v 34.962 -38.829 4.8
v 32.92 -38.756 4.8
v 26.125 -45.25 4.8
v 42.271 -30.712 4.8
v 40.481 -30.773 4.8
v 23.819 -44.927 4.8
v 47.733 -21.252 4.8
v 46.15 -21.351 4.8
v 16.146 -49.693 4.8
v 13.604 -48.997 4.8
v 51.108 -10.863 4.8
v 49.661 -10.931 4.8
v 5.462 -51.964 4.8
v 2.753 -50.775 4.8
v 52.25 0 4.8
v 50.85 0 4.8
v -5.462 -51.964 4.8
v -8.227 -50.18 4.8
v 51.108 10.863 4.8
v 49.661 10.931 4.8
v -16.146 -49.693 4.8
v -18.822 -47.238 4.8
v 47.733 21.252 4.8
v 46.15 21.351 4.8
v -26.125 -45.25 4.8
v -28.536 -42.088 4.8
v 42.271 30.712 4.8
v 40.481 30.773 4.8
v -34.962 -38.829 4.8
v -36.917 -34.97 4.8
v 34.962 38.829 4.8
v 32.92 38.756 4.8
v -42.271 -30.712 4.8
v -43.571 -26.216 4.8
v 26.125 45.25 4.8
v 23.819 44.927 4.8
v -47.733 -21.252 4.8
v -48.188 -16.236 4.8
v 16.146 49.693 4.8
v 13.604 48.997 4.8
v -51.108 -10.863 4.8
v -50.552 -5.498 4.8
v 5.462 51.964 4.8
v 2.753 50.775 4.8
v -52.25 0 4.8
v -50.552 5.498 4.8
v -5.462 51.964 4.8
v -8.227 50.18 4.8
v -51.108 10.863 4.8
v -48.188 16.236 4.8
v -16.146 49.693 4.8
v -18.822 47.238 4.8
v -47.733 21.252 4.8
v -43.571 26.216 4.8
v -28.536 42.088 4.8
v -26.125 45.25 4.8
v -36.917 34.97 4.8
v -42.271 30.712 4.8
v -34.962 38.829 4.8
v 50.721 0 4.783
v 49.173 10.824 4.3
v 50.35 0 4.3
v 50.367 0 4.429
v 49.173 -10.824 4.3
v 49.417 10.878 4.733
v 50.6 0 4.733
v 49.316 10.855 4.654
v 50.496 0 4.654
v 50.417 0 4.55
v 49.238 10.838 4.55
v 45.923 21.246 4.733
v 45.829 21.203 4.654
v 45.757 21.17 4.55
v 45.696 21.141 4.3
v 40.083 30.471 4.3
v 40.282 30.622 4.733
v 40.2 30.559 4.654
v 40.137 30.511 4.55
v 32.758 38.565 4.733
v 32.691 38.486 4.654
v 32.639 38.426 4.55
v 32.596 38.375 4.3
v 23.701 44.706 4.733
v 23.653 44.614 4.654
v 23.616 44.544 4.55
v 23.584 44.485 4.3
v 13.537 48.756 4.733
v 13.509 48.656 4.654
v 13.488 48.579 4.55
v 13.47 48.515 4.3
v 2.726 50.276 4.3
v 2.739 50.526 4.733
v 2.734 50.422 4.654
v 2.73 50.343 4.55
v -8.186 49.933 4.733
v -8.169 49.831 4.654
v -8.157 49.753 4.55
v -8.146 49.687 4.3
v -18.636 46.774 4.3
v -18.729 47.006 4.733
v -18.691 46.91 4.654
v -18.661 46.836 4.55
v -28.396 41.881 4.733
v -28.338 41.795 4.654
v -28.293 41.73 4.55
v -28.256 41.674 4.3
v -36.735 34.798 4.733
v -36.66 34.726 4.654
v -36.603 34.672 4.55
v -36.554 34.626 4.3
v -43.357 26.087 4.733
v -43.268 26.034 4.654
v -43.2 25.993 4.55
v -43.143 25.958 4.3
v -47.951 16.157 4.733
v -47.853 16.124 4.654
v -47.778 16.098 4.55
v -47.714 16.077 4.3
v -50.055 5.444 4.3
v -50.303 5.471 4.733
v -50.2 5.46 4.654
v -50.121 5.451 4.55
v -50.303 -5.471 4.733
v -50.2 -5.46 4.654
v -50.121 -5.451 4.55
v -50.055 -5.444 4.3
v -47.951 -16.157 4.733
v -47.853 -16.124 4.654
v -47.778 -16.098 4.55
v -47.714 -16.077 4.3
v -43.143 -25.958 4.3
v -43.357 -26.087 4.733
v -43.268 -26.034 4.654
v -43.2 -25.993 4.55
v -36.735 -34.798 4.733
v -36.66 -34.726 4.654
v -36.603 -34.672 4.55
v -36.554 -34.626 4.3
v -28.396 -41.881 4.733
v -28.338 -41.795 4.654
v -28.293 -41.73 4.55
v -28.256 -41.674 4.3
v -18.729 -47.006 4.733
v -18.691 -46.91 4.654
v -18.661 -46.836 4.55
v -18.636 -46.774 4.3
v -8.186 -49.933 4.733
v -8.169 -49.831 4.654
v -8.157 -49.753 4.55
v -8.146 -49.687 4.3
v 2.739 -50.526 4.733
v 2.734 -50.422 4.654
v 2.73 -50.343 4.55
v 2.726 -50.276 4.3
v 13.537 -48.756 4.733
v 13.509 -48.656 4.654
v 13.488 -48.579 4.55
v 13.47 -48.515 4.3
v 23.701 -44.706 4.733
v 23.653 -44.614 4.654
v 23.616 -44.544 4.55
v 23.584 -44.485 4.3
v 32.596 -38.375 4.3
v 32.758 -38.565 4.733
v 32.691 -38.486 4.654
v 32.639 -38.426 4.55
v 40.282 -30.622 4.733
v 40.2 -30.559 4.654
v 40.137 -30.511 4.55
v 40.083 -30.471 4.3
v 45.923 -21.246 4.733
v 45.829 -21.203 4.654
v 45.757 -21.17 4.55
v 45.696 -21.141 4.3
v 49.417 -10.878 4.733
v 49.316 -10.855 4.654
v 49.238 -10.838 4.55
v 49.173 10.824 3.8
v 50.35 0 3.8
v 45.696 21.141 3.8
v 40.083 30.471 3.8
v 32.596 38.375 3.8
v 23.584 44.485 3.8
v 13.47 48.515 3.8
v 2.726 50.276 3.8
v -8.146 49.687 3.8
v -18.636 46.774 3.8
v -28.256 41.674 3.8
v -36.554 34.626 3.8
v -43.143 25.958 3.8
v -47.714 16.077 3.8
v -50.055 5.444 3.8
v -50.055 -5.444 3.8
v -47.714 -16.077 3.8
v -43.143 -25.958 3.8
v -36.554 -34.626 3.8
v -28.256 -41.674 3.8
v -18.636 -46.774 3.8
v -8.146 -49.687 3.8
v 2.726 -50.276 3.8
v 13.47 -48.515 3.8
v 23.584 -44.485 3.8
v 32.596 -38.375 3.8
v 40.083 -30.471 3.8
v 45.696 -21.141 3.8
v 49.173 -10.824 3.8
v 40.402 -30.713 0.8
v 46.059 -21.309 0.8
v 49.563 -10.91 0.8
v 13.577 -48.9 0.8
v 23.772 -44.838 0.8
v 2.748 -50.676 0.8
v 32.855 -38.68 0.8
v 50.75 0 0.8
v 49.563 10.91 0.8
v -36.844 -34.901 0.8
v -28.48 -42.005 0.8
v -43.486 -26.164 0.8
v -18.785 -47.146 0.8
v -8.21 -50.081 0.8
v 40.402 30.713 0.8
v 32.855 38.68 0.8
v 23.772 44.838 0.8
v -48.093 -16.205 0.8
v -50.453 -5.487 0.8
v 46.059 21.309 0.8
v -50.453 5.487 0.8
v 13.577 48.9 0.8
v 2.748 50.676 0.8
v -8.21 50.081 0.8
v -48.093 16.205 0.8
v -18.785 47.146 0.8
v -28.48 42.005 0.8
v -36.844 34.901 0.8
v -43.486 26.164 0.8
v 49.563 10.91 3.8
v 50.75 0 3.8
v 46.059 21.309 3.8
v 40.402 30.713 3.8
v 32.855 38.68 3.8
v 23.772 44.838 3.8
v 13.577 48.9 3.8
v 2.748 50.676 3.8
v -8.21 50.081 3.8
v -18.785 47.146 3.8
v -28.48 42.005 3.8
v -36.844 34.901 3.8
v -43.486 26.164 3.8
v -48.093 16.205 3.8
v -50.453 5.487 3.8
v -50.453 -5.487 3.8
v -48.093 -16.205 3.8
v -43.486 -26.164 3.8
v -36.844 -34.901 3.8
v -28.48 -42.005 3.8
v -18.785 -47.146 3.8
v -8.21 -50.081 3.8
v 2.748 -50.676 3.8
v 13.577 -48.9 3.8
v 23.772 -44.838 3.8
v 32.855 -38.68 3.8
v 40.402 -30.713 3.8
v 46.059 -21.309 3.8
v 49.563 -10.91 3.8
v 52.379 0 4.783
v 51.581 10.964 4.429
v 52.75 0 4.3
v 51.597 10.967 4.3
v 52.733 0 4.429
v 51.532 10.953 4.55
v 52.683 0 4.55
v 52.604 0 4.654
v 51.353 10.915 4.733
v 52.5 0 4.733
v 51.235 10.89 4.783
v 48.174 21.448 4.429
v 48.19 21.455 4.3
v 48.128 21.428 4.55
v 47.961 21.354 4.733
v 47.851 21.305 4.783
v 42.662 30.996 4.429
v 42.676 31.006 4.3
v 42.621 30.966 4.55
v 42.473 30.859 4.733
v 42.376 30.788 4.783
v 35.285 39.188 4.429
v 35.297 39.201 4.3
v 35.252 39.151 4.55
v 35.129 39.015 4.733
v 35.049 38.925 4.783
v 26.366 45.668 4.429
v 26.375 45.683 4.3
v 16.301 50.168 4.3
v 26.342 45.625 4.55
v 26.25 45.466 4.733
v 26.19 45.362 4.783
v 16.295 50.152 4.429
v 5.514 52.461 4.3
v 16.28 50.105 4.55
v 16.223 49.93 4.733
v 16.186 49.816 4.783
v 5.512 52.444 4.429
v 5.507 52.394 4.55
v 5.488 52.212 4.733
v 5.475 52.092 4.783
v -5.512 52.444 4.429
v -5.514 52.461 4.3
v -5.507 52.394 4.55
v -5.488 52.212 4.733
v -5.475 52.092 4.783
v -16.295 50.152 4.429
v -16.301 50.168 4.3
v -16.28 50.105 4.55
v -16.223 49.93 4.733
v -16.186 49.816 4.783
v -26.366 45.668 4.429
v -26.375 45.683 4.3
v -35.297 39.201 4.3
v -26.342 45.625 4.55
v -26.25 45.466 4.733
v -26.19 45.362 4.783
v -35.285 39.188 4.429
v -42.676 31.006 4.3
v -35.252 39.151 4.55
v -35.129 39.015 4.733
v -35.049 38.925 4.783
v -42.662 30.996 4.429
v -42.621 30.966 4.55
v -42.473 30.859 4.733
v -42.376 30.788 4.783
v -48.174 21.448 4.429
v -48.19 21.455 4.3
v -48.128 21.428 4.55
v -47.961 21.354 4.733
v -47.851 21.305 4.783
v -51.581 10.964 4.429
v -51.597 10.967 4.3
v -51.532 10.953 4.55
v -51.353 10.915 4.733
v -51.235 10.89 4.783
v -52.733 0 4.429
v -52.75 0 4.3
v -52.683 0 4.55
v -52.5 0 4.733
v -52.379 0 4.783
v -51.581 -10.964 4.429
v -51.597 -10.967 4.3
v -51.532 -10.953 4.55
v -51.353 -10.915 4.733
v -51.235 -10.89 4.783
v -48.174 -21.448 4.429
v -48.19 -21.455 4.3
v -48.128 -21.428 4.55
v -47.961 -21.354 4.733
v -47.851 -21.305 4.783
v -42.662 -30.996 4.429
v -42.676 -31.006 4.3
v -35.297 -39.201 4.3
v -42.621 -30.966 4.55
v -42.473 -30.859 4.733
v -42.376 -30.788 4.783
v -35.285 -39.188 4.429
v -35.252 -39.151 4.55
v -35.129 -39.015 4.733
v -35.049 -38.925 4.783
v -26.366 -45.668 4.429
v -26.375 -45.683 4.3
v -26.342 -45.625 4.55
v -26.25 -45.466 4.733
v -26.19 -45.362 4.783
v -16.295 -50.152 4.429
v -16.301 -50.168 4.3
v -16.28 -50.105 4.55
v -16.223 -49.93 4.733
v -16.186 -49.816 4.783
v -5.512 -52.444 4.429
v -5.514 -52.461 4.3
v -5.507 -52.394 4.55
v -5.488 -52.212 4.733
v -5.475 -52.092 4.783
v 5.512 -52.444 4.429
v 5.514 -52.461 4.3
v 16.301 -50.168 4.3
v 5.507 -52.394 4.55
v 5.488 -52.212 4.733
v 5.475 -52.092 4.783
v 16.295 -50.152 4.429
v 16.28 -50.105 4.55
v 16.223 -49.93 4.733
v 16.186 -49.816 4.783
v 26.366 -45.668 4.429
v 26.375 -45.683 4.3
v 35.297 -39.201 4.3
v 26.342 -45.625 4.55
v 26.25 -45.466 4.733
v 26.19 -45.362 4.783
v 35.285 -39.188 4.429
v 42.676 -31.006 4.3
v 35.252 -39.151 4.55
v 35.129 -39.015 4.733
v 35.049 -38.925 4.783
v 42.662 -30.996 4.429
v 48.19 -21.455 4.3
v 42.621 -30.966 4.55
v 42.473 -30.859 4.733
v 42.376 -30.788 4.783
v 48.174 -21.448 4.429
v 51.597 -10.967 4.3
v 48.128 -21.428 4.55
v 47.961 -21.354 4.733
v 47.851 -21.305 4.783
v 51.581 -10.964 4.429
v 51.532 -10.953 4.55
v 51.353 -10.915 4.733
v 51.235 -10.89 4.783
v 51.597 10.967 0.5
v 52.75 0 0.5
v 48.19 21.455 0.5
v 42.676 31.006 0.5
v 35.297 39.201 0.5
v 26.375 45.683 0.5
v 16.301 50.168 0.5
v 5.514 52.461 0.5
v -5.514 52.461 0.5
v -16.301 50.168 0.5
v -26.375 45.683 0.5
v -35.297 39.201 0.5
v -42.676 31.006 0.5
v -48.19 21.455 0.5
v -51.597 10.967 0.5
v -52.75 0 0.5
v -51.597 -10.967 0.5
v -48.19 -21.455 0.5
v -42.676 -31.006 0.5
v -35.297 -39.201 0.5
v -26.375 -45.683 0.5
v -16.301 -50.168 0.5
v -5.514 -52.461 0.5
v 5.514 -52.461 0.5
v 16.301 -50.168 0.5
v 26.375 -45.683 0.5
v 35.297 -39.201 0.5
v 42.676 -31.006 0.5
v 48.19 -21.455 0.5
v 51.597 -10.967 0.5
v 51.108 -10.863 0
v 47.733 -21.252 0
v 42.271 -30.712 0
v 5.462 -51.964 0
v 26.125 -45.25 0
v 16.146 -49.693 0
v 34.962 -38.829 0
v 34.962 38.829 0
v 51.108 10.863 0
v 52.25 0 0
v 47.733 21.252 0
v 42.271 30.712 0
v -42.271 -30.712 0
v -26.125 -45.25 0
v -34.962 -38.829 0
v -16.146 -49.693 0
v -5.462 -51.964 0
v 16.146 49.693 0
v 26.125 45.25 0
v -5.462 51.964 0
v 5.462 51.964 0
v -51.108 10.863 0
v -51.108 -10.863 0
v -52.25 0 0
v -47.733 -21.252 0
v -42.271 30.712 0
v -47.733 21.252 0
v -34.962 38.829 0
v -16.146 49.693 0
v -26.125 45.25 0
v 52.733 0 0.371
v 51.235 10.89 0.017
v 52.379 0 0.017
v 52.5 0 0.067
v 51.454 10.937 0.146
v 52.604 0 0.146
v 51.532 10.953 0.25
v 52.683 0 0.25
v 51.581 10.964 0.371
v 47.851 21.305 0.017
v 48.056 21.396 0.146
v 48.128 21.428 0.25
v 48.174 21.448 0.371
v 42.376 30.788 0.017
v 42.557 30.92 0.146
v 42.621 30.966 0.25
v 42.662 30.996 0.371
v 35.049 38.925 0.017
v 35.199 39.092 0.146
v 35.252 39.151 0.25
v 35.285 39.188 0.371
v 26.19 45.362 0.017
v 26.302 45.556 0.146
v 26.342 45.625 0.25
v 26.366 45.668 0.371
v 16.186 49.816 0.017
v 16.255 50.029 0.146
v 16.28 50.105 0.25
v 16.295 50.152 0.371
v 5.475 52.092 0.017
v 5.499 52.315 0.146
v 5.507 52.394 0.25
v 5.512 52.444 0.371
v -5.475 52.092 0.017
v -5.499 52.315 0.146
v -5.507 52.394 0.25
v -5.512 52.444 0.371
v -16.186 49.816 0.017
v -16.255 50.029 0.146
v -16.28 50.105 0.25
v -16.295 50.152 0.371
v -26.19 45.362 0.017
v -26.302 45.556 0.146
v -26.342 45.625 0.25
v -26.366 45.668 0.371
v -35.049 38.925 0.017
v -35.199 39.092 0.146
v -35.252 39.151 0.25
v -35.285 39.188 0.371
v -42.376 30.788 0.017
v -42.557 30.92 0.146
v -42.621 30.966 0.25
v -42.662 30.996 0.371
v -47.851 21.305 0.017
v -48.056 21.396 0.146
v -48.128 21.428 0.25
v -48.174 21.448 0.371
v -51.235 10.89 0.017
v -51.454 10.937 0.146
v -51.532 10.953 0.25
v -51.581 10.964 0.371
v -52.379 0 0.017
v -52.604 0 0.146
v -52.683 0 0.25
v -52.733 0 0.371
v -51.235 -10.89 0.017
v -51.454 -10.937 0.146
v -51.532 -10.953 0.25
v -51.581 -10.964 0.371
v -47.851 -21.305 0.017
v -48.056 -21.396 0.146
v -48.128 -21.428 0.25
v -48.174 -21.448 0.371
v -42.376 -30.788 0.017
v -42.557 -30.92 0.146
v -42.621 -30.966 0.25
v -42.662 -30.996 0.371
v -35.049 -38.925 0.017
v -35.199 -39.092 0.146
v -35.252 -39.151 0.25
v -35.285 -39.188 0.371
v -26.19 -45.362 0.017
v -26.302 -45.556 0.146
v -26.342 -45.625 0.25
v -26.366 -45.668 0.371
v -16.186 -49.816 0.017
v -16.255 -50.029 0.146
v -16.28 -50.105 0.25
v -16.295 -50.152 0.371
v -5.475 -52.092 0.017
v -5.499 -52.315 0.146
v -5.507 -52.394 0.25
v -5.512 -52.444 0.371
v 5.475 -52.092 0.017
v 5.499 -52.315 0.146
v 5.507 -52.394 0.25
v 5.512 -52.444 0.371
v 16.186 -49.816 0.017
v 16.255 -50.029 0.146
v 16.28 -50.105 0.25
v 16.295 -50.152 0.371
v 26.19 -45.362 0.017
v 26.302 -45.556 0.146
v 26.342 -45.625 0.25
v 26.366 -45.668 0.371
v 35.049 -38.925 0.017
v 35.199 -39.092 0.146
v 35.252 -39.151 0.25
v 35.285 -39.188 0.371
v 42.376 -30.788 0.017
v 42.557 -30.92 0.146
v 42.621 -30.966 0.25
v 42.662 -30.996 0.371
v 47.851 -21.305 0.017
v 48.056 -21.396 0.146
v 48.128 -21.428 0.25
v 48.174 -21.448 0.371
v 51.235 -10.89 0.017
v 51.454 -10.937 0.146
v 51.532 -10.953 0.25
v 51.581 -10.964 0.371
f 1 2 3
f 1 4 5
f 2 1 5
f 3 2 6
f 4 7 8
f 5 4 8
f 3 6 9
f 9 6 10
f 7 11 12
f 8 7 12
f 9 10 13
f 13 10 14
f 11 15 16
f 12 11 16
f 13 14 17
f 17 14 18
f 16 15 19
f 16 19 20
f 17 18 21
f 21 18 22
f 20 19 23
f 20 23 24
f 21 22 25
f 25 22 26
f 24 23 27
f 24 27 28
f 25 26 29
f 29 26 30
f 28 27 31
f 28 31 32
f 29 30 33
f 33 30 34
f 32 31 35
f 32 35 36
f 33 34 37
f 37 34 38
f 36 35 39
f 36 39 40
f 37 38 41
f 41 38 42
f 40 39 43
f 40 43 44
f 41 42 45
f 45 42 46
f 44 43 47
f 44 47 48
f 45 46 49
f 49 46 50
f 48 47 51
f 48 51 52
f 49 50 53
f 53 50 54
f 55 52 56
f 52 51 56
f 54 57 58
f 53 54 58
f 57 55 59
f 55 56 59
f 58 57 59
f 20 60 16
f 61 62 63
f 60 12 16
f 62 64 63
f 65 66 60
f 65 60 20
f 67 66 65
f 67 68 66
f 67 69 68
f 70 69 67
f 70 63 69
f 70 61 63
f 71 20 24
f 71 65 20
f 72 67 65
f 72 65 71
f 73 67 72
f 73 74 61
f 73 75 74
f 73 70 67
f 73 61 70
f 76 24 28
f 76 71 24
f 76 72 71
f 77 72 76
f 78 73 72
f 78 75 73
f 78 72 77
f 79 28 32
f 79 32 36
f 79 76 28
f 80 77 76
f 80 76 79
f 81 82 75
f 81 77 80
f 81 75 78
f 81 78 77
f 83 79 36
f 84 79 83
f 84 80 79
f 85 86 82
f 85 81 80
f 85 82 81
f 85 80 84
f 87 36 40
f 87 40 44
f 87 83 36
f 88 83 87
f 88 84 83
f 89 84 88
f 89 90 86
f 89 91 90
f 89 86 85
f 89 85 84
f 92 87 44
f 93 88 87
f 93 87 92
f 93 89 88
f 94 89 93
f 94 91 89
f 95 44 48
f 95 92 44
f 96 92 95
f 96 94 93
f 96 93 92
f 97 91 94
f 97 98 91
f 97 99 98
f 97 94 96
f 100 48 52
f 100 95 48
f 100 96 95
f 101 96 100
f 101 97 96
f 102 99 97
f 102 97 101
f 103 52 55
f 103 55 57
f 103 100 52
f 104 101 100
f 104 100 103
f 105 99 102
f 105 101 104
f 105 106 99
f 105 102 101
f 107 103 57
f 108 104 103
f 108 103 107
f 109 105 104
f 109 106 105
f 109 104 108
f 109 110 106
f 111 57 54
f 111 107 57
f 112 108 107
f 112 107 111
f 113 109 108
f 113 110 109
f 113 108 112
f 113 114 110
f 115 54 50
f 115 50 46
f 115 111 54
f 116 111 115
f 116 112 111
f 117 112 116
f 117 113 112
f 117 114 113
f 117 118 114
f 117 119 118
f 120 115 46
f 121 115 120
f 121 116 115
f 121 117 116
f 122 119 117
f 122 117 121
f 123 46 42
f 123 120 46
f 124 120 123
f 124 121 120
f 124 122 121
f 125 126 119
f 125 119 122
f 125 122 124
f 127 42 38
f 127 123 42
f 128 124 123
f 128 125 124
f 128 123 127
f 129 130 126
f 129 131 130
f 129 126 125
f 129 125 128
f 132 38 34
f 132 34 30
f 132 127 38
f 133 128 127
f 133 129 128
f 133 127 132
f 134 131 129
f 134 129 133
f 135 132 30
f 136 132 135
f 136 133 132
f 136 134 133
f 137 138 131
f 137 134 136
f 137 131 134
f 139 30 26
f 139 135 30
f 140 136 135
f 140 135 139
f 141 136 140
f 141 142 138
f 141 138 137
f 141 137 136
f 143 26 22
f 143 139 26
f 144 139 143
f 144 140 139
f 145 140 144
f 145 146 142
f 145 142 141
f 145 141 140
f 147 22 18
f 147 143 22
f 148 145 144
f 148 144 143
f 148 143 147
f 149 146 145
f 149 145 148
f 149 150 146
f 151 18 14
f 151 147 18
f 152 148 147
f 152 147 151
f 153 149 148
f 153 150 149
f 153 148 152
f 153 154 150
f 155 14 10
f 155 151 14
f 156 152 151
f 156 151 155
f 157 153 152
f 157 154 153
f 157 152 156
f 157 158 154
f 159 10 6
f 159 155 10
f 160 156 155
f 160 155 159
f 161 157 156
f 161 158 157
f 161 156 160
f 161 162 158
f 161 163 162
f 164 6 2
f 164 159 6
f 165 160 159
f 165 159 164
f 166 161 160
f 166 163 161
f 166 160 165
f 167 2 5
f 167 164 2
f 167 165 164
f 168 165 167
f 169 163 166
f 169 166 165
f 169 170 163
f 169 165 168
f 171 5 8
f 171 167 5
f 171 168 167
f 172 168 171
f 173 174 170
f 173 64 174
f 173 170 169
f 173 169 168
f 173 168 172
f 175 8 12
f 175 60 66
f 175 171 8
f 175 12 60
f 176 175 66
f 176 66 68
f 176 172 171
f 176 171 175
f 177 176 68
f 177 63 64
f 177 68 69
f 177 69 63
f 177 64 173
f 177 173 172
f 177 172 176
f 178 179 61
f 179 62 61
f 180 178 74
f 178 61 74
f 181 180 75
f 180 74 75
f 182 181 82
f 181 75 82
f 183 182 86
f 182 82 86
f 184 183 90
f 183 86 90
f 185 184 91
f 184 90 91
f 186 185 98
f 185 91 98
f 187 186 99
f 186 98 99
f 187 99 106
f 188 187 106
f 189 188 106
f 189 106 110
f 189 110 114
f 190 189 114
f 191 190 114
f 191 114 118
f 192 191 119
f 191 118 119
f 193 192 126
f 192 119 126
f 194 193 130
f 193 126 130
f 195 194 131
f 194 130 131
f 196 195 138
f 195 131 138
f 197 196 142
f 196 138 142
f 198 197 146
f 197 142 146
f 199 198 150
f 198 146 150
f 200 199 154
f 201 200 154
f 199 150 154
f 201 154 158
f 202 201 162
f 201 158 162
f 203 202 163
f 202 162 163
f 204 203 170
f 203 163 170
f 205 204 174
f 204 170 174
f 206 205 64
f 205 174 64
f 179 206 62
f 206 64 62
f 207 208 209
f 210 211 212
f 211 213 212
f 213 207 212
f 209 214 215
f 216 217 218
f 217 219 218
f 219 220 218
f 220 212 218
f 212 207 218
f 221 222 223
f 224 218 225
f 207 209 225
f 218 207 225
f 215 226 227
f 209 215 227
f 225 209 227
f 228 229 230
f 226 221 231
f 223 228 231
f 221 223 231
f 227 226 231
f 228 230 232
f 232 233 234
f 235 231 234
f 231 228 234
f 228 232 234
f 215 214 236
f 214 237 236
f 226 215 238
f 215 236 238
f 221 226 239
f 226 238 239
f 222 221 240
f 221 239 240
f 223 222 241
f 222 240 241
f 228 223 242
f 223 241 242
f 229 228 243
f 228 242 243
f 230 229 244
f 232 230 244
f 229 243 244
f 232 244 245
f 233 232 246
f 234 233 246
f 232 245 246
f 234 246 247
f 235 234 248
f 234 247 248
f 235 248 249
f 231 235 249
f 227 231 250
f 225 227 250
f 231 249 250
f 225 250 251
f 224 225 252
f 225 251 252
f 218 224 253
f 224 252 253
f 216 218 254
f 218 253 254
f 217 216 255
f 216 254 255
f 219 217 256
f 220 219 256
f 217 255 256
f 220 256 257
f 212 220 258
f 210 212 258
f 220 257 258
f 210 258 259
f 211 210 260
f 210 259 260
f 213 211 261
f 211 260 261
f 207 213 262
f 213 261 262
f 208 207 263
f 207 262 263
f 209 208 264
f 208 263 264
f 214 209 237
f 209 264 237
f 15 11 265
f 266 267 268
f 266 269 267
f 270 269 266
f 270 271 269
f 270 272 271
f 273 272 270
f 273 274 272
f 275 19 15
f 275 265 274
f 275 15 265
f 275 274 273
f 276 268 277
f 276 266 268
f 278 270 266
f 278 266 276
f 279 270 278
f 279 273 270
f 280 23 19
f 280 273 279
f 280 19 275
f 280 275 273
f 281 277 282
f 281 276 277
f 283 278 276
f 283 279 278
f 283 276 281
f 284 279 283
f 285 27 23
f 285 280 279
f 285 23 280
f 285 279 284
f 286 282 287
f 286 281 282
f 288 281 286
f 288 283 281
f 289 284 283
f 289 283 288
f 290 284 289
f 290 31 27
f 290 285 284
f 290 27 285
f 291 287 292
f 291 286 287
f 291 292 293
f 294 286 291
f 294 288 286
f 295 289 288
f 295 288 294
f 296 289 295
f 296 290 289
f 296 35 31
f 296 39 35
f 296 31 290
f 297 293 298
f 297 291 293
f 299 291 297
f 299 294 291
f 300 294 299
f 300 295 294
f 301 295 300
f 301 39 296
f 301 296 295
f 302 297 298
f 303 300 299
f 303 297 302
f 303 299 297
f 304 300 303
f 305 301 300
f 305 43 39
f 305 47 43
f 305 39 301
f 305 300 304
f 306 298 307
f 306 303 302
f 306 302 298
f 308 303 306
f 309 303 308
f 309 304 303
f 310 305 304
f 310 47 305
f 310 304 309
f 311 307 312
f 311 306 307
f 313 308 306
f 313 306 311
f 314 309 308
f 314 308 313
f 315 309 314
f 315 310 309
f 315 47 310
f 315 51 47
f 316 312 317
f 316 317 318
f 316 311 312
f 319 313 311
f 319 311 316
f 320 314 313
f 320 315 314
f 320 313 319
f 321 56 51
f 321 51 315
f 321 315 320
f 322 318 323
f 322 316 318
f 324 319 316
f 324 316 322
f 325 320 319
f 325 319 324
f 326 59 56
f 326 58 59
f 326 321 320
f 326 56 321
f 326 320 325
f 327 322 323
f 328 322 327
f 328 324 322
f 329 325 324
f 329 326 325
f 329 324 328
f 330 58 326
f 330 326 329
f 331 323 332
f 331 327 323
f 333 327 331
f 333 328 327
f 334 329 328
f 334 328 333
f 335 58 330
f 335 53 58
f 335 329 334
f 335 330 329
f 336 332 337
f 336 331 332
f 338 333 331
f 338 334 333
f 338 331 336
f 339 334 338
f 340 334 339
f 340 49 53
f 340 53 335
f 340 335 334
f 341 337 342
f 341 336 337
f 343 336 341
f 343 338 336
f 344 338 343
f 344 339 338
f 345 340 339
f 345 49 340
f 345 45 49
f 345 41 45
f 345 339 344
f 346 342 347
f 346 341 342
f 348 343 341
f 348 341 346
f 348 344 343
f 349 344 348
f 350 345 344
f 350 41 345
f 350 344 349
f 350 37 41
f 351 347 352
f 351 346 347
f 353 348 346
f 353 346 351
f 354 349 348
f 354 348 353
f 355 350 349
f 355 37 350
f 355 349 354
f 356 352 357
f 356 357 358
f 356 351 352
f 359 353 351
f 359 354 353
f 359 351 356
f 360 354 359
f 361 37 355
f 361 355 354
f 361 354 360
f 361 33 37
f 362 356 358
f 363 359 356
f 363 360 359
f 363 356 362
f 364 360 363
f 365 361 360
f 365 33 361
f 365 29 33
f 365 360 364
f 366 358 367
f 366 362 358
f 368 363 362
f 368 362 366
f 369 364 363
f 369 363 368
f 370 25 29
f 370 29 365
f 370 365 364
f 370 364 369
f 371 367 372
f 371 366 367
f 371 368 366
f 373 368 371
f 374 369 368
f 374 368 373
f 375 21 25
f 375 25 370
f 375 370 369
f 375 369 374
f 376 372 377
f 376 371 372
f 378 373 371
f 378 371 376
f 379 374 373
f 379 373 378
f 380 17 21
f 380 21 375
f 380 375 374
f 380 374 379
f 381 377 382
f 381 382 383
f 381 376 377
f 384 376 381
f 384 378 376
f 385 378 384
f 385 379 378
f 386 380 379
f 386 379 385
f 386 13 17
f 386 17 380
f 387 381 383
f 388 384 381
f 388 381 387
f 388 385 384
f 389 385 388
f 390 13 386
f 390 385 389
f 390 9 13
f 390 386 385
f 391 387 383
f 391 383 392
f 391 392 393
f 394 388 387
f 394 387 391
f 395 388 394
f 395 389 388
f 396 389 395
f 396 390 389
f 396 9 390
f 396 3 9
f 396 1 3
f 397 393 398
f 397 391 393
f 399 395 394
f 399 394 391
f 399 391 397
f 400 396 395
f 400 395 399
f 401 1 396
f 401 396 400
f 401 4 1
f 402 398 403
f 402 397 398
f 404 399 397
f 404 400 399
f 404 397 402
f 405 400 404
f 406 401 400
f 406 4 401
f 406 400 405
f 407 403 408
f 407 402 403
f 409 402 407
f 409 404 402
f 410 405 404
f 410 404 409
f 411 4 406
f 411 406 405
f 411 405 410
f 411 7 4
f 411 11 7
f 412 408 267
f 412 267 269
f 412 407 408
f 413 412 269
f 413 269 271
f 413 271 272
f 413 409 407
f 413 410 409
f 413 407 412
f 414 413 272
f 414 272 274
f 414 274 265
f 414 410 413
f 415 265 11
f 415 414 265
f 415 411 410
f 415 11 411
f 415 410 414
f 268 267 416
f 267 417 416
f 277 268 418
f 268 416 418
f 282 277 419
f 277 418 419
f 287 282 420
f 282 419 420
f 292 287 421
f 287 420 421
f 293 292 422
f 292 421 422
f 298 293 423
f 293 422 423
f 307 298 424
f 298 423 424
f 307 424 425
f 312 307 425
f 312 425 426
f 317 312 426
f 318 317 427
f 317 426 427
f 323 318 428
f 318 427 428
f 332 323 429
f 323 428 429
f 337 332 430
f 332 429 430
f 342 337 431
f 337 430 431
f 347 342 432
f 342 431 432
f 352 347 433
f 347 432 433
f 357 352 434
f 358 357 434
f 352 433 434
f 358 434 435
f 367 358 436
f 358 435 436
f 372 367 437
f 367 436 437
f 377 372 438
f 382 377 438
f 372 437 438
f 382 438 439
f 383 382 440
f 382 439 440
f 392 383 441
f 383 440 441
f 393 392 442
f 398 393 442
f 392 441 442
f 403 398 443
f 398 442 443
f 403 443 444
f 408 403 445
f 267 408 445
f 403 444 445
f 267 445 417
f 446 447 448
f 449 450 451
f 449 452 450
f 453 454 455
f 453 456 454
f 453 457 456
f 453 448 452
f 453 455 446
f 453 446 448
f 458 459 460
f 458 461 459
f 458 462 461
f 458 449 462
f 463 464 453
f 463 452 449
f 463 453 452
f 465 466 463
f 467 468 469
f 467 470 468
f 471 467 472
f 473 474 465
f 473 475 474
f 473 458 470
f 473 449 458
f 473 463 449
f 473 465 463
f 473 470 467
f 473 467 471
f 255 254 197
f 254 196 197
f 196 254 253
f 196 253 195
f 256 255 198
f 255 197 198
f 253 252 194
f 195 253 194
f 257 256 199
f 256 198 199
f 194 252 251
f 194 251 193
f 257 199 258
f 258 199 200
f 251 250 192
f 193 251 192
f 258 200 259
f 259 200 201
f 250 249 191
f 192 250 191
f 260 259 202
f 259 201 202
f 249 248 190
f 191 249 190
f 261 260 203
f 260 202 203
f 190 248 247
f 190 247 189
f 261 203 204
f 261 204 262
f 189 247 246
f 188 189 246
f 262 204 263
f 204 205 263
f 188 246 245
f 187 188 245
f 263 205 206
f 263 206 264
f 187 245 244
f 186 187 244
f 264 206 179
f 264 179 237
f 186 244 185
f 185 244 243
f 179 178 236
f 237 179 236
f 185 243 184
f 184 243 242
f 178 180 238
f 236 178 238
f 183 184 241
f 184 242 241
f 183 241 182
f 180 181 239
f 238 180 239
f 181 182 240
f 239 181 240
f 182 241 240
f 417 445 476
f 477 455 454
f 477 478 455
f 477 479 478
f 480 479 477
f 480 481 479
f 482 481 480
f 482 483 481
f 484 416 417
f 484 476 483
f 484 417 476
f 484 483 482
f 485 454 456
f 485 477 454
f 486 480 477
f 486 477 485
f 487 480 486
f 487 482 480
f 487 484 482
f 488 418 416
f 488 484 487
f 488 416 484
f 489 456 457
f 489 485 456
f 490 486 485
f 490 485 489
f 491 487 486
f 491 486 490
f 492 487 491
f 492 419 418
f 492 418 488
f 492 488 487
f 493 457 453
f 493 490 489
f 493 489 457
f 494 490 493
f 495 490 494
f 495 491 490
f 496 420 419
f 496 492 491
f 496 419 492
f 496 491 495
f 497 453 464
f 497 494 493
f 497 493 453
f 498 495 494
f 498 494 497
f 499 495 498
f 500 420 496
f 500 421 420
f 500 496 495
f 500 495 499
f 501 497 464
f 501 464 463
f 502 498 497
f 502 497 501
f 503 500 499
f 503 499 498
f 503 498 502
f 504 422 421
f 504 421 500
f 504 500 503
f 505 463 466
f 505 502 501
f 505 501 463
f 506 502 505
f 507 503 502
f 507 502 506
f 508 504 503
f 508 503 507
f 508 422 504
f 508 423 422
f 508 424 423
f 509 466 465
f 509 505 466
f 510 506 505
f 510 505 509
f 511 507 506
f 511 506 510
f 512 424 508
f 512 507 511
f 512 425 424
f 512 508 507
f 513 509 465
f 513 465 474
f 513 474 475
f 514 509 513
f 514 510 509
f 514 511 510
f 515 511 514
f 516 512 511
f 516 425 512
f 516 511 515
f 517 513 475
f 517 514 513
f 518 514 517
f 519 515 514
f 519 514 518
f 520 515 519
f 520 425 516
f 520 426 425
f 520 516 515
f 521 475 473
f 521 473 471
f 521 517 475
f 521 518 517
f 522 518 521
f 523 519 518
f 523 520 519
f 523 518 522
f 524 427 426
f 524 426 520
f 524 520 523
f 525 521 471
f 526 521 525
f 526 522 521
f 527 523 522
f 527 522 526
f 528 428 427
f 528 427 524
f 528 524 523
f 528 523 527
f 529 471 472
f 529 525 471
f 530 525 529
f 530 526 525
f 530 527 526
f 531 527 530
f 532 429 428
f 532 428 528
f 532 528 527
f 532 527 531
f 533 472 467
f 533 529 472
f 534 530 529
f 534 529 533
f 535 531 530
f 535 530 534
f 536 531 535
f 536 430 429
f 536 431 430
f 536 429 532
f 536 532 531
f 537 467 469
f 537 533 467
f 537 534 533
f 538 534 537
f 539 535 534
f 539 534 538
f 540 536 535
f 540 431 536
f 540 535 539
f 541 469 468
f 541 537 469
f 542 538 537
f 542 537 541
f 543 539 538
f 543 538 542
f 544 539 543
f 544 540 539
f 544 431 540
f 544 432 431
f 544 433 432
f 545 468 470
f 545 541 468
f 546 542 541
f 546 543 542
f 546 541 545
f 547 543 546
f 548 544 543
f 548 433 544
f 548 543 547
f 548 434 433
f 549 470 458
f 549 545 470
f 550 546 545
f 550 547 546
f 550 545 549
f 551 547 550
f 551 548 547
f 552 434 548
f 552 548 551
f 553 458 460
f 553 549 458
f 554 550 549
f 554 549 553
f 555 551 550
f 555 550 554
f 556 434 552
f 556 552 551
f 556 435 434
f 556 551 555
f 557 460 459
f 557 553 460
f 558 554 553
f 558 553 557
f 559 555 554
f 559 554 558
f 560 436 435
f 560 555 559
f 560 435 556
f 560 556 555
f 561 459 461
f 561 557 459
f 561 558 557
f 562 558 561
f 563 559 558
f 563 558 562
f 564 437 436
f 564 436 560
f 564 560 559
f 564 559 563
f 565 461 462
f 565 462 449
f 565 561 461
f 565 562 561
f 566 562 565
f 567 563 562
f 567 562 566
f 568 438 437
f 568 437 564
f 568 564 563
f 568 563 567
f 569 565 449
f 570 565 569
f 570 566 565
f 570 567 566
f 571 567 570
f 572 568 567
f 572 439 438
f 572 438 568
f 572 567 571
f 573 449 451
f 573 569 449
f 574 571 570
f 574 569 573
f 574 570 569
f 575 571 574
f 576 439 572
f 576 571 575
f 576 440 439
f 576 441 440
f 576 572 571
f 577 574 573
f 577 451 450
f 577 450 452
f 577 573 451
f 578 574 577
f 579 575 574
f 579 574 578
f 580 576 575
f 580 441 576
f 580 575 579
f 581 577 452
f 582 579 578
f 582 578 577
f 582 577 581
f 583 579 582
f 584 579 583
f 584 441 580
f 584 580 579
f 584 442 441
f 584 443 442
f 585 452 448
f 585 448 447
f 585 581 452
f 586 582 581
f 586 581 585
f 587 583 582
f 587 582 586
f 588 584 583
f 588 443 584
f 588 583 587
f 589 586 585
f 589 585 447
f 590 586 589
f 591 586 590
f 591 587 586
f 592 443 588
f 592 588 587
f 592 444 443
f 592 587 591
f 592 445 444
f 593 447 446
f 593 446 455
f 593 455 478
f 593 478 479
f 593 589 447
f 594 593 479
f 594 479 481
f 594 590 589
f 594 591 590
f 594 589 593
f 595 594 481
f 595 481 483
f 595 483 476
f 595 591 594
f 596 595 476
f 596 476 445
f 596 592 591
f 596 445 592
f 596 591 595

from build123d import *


with BuildPart() as part:
    # Sketch → Revolution (revolve)
    with BuildSketch(Plane.XZ):
        with BuildLine():
            Line((0, 0), (52.25, 0))
            ThreePointArc((52.25, 0), (52.603553, 0.146447), (52.75, 0.5))
            Line((52.75, 4.3), (52.75, 0.5))
            ThreePointArc((52.75, 4.3), (52.603553, 4.653553), (52.25, 4.8))
            Line((50.85, 4.8), (52.25, 4.8))
            ThreePointArc((50.85, 4.8), (50.496447, 4.653553), (50.35, 4.3))
            Line((50.35, 3.8), (50.35, 4.3))
            Line((50.75, 3.8), (50.35, 3.8))
            Line((50.75, 0.8), (50.75, 3.8))
            Line((0, 0.8), (50.75, 0.8))
            Line((0, 0), (0, 0.8))
        make_face()
    revolve(axis=Axis((0, 0, 0), (0, 0, 1)))


solid = part.part
